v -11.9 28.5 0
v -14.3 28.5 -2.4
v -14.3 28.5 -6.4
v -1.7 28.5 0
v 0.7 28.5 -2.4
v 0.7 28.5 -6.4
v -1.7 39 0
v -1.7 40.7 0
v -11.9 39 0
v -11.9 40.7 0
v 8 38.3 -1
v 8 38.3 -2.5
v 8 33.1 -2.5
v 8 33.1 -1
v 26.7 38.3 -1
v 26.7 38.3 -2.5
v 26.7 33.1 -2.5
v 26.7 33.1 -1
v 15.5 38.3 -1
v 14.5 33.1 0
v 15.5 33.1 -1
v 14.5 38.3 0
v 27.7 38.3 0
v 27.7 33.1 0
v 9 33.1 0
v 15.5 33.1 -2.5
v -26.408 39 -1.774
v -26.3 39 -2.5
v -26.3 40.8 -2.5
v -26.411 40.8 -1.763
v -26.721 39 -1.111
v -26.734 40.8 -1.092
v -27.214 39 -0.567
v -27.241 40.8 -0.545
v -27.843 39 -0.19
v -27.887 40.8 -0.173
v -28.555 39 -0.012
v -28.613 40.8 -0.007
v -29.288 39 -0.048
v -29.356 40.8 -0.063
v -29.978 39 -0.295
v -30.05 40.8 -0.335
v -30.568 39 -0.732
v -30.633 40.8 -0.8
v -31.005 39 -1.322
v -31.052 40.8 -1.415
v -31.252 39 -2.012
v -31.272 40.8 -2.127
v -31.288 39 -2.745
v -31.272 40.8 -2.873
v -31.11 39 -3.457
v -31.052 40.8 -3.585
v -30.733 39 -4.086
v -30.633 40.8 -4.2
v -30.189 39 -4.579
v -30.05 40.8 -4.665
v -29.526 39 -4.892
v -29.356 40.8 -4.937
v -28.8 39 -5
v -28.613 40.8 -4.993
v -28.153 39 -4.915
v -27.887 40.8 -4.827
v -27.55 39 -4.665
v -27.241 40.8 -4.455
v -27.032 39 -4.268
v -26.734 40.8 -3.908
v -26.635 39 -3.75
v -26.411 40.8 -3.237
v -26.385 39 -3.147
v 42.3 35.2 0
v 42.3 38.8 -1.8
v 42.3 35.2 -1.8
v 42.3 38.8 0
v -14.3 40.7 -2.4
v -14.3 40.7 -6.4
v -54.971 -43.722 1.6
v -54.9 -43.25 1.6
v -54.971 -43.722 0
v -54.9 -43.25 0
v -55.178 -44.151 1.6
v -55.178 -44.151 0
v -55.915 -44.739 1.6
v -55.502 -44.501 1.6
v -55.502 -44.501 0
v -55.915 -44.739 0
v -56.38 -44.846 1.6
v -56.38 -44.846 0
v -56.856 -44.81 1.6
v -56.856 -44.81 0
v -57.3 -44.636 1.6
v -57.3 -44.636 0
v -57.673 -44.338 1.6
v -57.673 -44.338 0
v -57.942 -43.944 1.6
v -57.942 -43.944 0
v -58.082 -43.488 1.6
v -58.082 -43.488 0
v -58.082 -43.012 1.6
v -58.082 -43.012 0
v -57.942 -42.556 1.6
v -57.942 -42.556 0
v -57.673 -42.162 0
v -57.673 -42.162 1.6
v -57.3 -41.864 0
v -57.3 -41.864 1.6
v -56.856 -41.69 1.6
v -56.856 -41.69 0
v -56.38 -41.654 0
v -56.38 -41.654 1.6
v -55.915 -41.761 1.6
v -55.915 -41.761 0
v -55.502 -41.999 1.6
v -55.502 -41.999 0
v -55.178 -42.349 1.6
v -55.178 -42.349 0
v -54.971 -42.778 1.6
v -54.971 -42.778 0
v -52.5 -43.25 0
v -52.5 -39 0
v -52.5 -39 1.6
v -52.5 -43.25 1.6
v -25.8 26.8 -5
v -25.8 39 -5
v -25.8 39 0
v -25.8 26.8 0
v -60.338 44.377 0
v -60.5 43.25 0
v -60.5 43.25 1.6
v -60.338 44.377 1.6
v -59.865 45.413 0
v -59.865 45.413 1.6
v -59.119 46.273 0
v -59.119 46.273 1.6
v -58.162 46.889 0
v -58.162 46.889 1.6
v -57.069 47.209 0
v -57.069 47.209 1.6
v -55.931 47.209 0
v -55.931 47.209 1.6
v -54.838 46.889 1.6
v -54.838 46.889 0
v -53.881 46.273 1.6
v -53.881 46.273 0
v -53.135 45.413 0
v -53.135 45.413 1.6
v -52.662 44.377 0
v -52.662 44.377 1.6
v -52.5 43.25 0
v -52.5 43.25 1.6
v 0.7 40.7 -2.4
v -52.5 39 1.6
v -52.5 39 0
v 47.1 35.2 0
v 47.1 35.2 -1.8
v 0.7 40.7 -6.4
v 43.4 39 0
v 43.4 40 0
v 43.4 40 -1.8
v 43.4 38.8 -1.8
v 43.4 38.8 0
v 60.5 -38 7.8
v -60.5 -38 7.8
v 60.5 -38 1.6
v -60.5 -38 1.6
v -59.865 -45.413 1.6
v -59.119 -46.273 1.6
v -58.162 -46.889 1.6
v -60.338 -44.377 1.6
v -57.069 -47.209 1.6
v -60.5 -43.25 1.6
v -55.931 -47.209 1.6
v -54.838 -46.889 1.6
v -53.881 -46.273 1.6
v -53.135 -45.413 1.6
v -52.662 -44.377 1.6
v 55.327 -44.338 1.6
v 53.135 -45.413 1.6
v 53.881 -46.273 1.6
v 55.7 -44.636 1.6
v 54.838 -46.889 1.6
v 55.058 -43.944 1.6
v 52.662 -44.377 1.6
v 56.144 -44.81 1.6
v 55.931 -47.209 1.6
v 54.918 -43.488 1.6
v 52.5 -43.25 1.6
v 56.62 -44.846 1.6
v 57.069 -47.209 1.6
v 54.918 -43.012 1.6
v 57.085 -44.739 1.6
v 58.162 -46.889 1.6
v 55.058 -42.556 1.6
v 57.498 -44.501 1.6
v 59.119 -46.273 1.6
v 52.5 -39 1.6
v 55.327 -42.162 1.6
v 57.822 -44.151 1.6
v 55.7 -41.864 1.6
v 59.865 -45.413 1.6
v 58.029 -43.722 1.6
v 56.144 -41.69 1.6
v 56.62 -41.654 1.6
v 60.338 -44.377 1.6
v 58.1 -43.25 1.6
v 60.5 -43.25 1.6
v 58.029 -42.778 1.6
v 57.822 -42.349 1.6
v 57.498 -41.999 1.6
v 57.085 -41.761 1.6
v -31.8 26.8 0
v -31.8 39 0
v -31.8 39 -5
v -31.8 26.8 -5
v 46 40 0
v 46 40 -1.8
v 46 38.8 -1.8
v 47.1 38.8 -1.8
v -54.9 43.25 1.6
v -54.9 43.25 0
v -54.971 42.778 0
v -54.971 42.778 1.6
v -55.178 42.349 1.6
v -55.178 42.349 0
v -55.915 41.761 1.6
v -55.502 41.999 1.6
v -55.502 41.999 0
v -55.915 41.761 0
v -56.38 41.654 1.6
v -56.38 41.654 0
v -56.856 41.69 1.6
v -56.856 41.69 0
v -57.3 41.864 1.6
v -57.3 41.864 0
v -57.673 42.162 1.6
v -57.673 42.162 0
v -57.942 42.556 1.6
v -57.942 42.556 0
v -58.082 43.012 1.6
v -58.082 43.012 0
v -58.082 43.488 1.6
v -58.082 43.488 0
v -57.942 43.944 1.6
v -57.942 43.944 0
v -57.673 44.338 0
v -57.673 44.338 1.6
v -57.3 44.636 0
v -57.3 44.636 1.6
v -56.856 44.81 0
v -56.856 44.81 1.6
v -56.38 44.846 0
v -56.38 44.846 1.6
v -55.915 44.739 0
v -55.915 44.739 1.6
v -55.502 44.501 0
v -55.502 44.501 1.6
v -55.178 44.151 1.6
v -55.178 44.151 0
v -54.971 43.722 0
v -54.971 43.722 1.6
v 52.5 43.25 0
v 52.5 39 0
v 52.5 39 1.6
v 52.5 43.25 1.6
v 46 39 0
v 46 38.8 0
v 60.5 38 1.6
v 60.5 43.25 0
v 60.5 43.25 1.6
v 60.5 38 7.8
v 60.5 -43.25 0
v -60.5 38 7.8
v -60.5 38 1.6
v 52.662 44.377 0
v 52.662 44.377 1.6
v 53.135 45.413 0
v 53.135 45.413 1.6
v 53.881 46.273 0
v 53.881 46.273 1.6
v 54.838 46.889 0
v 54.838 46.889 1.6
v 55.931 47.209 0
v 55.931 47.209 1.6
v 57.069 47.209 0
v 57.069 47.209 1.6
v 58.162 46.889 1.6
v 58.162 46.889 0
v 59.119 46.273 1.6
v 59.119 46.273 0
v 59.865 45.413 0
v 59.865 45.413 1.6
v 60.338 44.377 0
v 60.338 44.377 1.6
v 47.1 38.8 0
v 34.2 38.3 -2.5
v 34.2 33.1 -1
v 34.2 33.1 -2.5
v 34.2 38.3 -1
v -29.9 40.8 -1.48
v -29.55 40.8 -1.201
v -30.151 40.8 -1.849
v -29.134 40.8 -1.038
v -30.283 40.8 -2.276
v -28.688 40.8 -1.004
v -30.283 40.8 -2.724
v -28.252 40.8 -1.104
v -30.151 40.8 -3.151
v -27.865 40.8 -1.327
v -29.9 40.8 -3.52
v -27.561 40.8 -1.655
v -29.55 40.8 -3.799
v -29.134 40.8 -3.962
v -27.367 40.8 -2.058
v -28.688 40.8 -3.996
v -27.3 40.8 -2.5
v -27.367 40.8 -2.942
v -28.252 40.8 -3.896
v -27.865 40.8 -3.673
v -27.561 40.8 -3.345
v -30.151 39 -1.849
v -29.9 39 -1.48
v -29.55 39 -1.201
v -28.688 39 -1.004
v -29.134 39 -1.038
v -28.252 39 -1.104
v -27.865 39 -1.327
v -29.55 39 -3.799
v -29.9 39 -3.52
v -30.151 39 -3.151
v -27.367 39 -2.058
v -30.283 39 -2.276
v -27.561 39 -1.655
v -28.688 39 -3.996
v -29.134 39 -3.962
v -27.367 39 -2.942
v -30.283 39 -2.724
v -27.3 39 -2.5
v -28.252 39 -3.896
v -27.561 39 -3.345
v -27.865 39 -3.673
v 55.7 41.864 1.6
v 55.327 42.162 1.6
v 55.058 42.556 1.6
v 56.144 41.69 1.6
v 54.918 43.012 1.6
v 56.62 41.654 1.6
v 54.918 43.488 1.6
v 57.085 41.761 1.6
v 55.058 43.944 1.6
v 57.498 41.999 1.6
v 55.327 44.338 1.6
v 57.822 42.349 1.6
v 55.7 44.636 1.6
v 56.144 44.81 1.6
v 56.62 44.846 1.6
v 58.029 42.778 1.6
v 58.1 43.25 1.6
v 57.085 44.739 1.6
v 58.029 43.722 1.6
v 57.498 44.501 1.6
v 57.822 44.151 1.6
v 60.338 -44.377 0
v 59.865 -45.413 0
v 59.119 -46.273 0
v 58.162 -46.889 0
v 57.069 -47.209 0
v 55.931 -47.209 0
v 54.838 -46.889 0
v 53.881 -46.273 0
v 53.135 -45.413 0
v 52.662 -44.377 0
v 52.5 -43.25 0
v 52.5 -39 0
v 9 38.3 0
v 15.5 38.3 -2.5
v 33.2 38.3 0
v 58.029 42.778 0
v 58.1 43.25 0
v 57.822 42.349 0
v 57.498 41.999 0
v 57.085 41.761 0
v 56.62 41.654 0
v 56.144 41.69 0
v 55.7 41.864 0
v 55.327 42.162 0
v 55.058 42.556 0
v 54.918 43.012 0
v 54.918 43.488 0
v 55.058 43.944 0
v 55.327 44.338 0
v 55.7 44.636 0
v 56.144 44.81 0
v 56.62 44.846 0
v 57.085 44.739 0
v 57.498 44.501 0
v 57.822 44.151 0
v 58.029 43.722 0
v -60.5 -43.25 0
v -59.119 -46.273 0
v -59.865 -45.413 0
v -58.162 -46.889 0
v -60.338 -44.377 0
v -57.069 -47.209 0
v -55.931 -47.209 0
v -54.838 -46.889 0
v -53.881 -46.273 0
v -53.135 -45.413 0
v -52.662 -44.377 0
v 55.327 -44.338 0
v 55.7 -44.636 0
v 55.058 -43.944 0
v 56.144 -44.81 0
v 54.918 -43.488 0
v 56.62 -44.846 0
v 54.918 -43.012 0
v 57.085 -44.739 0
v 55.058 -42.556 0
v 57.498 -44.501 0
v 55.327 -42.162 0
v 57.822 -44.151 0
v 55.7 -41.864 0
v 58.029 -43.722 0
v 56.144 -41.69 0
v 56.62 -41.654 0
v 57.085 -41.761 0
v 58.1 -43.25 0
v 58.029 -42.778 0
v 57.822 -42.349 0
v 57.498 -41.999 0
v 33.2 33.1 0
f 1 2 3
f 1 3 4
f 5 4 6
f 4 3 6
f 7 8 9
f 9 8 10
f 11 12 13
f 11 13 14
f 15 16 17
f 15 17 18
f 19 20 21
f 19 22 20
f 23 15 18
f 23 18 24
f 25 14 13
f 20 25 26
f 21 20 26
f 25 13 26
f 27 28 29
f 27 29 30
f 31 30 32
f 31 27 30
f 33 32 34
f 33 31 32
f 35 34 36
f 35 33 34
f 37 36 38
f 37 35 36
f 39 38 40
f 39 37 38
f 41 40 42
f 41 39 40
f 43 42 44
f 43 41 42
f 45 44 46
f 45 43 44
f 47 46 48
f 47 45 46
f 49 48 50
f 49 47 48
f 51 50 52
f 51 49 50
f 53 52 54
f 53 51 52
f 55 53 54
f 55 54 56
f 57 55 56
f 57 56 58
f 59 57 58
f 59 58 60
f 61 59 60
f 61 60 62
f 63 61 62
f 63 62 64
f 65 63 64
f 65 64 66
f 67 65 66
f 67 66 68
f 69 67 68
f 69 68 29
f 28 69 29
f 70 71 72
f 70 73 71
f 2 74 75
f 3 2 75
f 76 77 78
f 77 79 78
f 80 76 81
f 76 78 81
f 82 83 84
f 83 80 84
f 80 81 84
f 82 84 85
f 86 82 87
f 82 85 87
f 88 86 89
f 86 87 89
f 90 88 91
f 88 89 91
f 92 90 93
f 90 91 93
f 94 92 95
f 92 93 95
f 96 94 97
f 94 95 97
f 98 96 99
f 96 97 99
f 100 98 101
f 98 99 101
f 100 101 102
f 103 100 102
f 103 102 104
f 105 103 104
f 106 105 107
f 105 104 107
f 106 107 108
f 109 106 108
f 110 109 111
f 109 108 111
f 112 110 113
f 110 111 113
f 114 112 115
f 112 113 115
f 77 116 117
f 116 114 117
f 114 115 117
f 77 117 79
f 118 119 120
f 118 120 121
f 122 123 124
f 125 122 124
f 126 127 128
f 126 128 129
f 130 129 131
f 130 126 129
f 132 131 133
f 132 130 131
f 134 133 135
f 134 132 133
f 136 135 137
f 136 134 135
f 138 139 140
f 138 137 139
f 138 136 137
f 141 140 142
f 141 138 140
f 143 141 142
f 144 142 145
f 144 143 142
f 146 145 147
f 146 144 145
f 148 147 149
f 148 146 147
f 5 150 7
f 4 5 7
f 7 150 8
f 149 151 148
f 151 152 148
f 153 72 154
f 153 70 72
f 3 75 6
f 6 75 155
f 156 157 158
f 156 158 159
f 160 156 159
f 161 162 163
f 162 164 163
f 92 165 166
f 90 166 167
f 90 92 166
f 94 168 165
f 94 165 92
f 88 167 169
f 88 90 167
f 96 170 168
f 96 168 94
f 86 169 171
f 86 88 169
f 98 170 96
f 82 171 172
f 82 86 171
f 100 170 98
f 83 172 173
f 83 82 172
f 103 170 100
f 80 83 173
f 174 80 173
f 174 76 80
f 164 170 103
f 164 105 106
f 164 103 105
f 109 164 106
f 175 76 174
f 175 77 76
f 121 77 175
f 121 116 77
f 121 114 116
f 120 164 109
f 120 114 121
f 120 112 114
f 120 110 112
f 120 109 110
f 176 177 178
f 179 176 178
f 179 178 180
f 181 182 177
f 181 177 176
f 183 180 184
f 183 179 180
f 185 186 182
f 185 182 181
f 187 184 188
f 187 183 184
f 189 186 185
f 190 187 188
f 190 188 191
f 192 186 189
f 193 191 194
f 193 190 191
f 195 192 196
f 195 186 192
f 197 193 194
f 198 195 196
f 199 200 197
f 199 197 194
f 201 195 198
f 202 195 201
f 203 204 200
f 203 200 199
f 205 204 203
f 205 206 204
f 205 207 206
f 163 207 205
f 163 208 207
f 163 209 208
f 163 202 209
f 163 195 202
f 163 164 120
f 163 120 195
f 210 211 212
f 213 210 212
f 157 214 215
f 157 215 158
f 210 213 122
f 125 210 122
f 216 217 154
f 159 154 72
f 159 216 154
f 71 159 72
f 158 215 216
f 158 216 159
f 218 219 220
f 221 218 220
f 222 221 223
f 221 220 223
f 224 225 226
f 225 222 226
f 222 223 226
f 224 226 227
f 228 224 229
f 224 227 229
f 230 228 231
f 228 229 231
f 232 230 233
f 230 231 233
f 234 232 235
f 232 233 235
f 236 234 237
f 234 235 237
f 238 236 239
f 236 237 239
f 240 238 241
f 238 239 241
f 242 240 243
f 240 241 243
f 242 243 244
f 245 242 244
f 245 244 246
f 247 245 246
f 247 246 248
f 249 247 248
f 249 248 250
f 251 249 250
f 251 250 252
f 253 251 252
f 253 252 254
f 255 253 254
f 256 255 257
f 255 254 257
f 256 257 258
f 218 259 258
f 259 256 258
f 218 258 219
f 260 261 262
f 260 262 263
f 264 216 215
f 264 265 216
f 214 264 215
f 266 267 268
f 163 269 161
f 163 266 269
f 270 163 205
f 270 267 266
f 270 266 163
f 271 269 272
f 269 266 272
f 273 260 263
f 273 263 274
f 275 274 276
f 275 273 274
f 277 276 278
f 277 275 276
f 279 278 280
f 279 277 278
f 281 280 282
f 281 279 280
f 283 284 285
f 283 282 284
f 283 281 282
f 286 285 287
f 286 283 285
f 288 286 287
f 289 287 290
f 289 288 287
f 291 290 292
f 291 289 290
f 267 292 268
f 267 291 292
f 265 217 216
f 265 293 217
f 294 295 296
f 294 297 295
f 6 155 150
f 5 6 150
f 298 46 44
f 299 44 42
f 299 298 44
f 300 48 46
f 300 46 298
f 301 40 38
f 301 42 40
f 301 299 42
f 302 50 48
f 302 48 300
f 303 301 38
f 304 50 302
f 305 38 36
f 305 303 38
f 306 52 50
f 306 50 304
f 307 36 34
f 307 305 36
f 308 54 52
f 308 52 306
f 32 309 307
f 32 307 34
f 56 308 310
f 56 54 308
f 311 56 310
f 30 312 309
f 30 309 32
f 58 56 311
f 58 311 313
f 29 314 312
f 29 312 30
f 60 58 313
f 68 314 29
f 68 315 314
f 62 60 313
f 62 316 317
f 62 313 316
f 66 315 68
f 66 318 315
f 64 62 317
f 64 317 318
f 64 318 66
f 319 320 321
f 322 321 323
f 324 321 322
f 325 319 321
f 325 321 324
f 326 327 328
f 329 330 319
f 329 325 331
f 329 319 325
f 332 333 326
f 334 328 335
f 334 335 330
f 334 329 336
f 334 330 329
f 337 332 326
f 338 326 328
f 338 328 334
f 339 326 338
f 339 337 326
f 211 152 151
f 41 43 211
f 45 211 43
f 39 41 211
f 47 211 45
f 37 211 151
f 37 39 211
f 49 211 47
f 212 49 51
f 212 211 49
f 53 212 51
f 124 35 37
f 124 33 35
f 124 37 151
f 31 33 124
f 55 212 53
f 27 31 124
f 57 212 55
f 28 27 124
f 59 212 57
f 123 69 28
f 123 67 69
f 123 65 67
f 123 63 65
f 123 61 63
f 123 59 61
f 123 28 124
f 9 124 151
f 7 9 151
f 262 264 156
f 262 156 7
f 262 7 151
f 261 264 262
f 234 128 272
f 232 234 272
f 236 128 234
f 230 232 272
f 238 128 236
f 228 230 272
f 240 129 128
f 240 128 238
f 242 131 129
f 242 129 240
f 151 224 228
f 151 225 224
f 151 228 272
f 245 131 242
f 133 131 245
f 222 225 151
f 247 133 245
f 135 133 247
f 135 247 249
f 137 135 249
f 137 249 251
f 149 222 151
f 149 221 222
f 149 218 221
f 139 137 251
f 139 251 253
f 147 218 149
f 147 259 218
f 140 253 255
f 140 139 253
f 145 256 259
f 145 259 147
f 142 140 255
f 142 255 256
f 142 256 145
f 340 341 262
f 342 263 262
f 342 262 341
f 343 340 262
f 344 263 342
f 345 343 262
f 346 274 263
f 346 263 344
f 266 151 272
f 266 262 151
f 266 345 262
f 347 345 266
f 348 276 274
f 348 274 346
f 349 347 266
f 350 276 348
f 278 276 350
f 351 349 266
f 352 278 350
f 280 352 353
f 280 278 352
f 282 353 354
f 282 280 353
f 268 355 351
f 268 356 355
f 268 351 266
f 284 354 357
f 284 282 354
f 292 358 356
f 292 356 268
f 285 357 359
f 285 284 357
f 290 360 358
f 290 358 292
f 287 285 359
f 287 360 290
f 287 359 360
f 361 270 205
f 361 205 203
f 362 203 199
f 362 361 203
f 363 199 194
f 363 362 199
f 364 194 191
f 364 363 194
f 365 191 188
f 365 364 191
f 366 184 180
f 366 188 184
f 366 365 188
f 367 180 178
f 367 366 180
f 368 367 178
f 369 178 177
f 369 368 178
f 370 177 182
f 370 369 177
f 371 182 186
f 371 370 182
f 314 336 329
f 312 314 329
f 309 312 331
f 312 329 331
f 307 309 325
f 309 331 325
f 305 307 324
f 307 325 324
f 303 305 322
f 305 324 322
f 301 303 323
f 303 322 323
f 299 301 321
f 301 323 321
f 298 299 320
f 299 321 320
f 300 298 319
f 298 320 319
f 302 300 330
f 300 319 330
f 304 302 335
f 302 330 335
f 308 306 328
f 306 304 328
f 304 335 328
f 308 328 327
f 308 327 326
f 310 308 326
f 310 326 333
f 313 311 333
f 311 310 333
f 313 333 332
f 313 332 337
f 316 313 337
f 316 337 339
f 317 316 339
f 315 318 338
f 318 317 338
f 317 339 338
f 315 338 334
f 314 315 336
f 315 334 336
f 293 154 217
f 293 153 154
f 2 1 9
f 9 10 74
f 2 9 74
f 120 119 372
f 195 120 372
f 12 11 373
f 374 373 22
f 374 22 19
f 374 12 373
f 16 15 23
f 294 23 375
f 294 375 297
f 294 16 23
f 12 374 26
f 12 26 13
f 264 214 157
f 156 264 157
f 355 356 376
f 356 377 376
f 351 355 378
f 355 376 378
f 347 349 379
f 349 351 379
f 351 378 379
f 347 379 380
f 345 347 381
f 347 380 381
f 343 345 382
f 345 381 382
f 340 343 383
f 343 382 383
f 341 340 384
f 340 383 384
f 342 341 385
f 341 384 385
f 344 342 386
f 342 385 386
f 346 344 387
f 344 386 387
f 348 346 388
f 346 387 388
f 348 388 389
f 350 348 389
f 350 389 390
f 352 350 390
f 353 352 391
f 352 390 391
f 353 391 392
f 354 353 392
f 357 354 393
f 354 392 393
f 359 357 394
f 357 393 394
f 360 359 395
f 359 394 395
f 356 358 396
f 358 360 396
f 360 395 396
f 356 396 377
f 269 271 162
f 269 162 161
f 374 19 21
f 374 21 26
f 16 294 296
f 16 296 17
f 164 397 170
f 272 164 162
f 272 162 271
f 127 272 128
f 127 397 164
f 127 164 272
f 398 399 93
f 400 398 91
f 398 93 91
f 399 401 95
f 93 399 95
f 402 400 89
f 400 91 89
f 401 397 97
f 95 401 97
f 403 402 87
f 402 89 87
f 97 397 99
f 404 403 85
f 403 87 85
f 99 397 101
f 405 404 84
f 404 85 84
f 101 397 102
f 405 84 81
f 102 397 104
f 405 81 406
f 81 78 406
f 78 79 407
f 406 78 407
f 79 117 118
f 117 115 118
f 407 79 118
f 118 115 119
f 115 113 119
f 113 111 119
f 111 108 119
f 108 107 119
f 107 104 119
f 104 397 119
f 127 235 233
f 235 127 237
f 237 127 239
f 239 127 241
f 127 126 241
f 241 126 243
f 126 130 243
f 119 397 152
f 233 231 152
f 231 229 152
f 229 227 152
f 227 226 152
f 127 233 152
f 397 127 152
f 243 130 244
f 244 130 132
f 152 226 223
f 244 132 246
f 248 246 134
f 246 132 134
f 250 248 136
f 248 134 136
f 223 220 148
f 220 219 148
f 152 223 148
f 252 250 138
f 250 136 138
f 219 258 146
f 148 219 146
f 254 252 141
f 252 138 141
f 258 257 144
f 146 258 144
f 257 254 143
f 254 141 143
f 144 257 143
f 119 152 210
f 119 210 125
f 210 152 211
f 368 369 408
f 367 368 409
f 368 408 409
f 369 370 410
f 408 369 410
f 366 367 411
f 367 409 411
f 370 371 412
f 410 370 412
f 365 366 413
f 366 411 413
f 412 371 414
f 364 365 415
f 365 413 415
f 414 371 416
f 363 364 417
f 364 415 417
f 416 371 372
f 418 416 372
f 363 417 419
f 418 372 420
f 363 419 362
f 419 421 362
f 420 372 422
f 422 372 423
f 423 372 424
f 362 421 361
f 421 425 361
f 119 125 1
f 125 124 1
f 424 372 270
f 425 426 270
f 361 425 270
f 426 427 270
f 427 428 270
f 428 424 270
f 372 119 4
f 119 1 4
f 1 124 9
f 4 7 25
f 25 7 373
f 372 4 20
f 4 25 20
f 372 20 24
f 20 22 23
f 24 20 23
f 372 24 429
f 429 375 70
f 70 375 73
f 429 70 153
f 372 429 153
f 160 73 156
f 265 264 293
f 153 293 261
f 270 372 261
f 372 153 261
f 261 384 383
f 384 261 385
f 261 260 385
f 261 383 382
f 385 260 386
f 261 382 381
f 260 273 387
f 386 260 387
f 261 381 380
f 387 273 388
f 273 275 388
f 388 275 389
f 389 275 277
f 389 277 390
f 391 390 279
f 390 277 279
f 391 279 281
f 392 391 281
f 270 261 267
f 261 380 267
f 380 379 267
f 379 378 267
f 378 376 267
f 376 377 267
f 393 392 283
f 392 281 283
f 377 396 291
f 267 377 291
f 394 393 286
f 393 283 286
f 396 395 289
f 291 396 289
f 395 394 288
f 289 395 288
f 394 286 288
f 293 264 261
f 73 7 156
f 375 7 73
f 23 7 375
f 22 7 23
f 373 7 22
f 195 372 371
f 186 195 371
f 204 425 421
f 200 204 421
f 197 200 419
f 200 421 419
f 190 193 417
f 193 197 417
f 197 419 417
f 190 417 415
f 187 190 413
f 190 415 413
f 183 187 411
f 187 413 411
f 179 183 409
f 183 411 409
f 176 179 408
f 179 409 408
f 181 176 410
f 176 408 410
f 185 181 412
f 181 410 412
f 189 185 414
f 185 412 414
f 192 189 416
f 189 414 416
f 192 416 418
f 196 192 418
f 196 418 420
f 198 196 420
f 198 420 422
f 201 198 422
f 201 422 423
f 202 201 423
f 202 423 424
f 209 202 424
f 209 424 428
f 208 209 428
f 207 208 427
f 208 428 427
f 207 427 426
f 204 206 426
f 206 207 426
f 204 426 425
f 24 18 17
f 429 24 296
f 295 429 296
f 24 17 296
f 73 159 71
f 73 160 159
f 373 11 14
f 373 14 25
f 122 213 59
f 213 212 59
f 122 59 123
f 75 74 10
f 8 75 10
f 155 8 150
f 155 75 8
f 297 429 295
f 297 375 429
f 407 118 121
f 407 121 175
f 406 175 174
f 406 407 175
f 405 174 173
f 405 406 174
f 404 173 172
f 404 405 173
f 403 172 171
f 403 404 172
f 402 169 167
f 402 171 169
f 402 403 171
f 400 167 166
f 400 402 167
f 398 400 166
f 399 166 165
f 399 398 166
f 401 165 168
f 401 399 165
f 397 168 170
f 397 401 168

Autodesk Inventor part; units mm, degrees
ref_plane "YZ Plane" through (0, 0, 0) normal (1, 0, 0) x (0, 1, 0)
sketch "Skizze1" plane through (0, 0, 0) normal (0, 0, 1) x (1, 0, 0)
  line L0 (-52.5, 39) -> (52.5, 39)
  line L1 (-52.5, -39) -> (52.5, -39)
  line L2 (52.5, -39) -> (52.5, -43.25)
  line L3 (-52.5, -39) -> (-52.5, -43.25)
  line L4 (-60.5, -43.25) -> (-60.5, 43.25)
  line L5 (-52.5, 39) -> (-52.5, 43.25)
  line L6 (52.5, 39) -> (52.5, 43.25)
  line L7 (60.5, 43.25) -> (60.5, -43.25)
  arc A0 (-52.5, 43.25) -> (-60.5, 43.25) centre (-56.5, 43.25) ccw
  arc A1 (60.5, 43.25) -> (52.5, 43.25) centre (56.5, 43.25) ccw
  arc A2 (52.5, -43.25) -> (60.5, -43.25) centre (56.5, -43.25) ccw
  arc A3 (-60.5, -43.25) -> (-52.5, -43.25) centre (-56.5, -43.25) ccw
  line L8 (0, 66.15) -> (0, -66.15) construction
  line L9 (-84.7, 0) -> (84.7, 0) construction
  circle A4 centre (-56.5, 43.25) radius 1.6
  circle A5 centre (56.5, 43.25) radius 1.6
  circle A6 centre (56.5, -43.25) radius 1.6
  circle A7 centre (-56.5, -43.25) radius 1.6
  point P0 (0, 0)
  dimension "d0" = 121
  dimension "d1" = 78
  dimension "d2" = 8
  dimension "d3" = 86.5
  dimension "d4" = 3.2
extrude "Extrusion1" add sketch "Skizze1" along normal blind 1.6
sketch "Skizze2" plane through (0, 0, 1.6) normal (0, 0, 1) x (1, 0, 0)
  line L0 (-60.5, -38) -> (60.5, -38)
  line L1 (60.5, -38) -> (60.5, 38)
  line L2 (60.5, 38) -> (-60.5, 38)
  line L3 (-60.5, 38) -> (-60.5, -38)
  line L4 (-60.5, -38) -> (60.5, 38) construction
  line L5 (60.5, -38) -> (-60.5, 38) construction
  point P0 (0, 0)
  dimension "d7" = 76
  dimension "d8" = 121
extrude "Extrusion2" add sketch "Skizze2" along normal blind 6.2
ref_plane "Arbeitsebene1" through (-52.5, 38.3, 0) normal (0, 1, 0) x (1, 0, 0)
sketch "Skizze3" plane through (-52.5, 38.3, 0) normal (0, 1, 0) x (1, 0, 0)
  line L0 (60.5, 2.5) -> (60.5, 1)
  line L1 (60.5, 1) -> (61.5, 0)
  line L2 (61.5, 0) -> (67, 0)
  line L3 (67, 0) -> (68, 1)
  line L4 (68, 1) -> (68, 2.5)
  line L5 (68, 2.5) -> (60.5, 2.5)
  line L6 (64.25, 2.5) -> (64.25, 0) construction
  line L7 (79.2, 2.5) -> (79.2, 1)
  line L8 (79.2, 1) -> (80.2, 0)
  line L9 (80.2, 0) -> (85.7, 0)
  line L10 (85.7, 0) -> (86.7, 1)
  line L11 (86.7, 1) -> (86.7, 2.5)
  line L12 (86.7, 2.5) -> (79.2, 2.5)
  line L13 (82.95, 2.5) -> (82.95, 0) construction
  line L14 (0, 0) -> (-8, 0) construction
  line L15 (105, 0) -> (0, 0) construction
  line L16 (113, 0) -> (105, 0) construction
  line L17 (105, 0) -> (113, 0) construction
  line L18 (0, 0) -> (105, 0) construction
  line L19 (-8, 0) -> (0, 0) construction
  line L20 (-2.4, 0) -> (-5.6, 0) construction
  line L21 (110.6, 0) -> (107.4, 0) construction
  line L22 (110.6, 0) -> (107.4, 0) construction
  line L23 (-2.4, 0) -> (-5.6, 0) construction
  line L24 (105, 0) -> (105, -1.6) construction
  line L25 (105, 0) -> (105, -1.6) construction
  point P0 (52.5, 0)
  dimension "d12" = 7.5
  dimension "d13" = 2.5
  dimension "d14" = 1.5
  dimension "d15" = 7.5
  dimension "d16" = 2.5
  dimension "d17" = 1.5
  dimension "d18" = 18.3
  dimension "d19" = 11.2
extrude "Extrusion3" add sketch "Skizze3" against normal blind 5.2
ref_plane "Arbeitsebene2" through (-52.5, 40.7, 0) normal (0, 1, 0) x (1, 0, 0)
sketch "Skizze4" plane through (-52.5, 40.7, 0) normal (0, 1, 0) x (1, 0, 0)
  line L0 (80.2, 0) -> (85.7, 0) projected
  line L1 (85.7, 0) -> (80.2, 0) projected
  line L2 (61.5, 0) -> (67, 0) projected
  line L3 (67, 0) -> (61.5, 0) projected
  line L4 (0, 0) -> (-8, 0) projected
  line L5 (105, 0) -> (0, 0) projected
  line L6 (113, 0) -> (105, 0) projected
  line L7 (105, 0) -> (113, 0) projected
  line L8 (0, 0) -> (105, 0) projected
  line L9 (-8, 0) -> (0, 0) projected
  line L10 (-2.4, 0) -> (-5.6, 0) projected
  line L11 (110.6, 0) -> (107.4, 0) projected
  line L12 (110.6, 0) -> (107.4, 0) projected
  line L13 (-2.4, 0) -> (-5.6, 0) projected
  line L14 (105, 0) -> (105, -1.6) projected
  line L15 (105, 0) -> (105, -1.6) projected
  line L16 (38.2, 6.4) -> (53.2, 6.4)
  line L17 (53.2, 6.4) -> (53.2, 2.4)
  line L18 (53.2, 2.4) -> (50.8, 0)
  line L19 (50.8, 0) -> (40.6, 0)
  line L20 (40.6, 0) -> (38.2, 2.4)
  line L21 (38.2, 2.4) -> (38.2, 6.4)
  line L22 (45.7, 6.4) -> (45.7, 0) construction
  point P0 (52.5, 0)
  point P1 (40.6, 0)
  point P2 (50.8, 0)
  dimension "d23" = 15
  dimension "d24" = 6.4
  dimension "d25" = 4
  dimension "d26" = 51.8
extrude "Extrusion4" add sketch "Skizze4" against normal blind 12.2
sketch "Skizze5" plane through (-52.5, 39, 1.6) normal (0, 1, 0) x (1, 0, 0)
  line L0 (20.7, 6.6) -> (26.7, 6.6)
  line L1 (26.7, 6.6) -> (26.7, 1.6)
  line L2 (26.7, 1.6) -> (20.7, 1.6)
  line L3 (20.7, 1.6) -> (20.7, 6.6)
  line L4 (105, 1.6) -> (50.8, 1.6) projected
  line L5 (113, 1.6) -> (105, 1.6) projected
  line L6 (105, 1.6) -> (113, 1.6) projected
  line L7 (0, 1.6) -> (105, 1.6) projected
  line L8 (-8, 1.6) -> (0, 1.6) projected
  line L9 (0, 1.6) -> (-8, 1.6) projected
  line L10 (40.6, 1.6) -> (0, 1.6) projected
  line L11 (40.6, 1.6) -> (50.8, 1.6) projected
  line L12 (80.2, 1.6) -> (85.7, 1.6) projected
  line L13 (85.7, 1.6) -> (80.2, 1.6) projected
  line L14 (61.5, 1.6) -> (67, 1.6) projected
  line L15 (67, 1.6) -> (61.5, 1.6) projected
  line L16 (-2.4, 1.6) -> (-5.6, 1.6) projected
  line L17 (110.6, 1.6) -> (107.4, 1.6) projected
  line L18 (110.6, 1.6) -> (107.4, 1.6) projected
  line L19 (-2.4, 1.6) -> (-5.6, 1.6) projected
  line L20 (40.6, 1.6) -> (0, 1.6) projected
  line L21 (105, 1.6) -> (105, 0) projected
  point P0 (52.5, 1.6)
  dimension "d29" = 5
  dimension "d30" = 6
  dimension "d31" = 78.3
extrude "Extrusion5" add sketch "Skizze5" against normal blind 12.2
sketch "Skizze6" plane through (-52.5, 39, 1.6) normal (0, 1, 0) x (1, 0, 0)
  line L0 (26.7, 6.6) -> (20.7, 6.6) projected
  line L1 (20.7, 6.6) -> (20.7, 1.6) projected
  line L2 (26.7, 1.6) -> (26.7, 6.6) projected
  line L3 (20.7, 6.6) -> (26.7, 1.6) construction
  line L4 (26.7, 6.6) -> (20.7, 1.6) construction
  circle A0 centre (23.7, 4.1) radius 2.5
  circle A1 centre (23.7, 4.1) radius 1.5
  point P0 (52.5, 1.6)
  dimension "d34" = 3
extrude "Extrusion6" add sketch "Skizze6" along normal blind 1.8
sketch "Skizze7" plane through (0, 0, 0) normal (0, 0, -1) x (-1, 0, 0)
  line L0 (-42.3, 35.2) -> (-47.1, 35.2)
  line L1 (-47.1, 35.2) -> (-47.1, 38.8)
  line L2 (-42.3, 38.8) -> (-42.3, 35.2)
  line L3 (-46, 38.8) -> (-46, 40)
  line L4 (-46, 40) -> (-43.4, 40)
  line L5 (-43.4, 40) -> (-43.4, 38.8)
  line L6 (-47.1, 38.8) -> (-46, 38.8)
  line L7 (-43.4, 38.8) -> (-42.3, 38.8)
  line L8 (-44.7, 35.2) -> (-44.7, 40) construction
  line L9 (-52.5, 43.25) -> (-52.5, 39) construction
  line L10 (-52.5, 39) -> (1.7, 39) construction
  point P0 (0, 0)
  dimension "d37" = 2.6
  dimension "d38" = 1.2
  dimension "d39" = 3.6
  dimension "d40" = 4.8
  dimension "d41" = 5.4
  dimension "d42" = 1
extrude "Extrusion7" add sketch "Skizze7" along normal blind 1.8
properties part number "Display 5inch JRP5002"
